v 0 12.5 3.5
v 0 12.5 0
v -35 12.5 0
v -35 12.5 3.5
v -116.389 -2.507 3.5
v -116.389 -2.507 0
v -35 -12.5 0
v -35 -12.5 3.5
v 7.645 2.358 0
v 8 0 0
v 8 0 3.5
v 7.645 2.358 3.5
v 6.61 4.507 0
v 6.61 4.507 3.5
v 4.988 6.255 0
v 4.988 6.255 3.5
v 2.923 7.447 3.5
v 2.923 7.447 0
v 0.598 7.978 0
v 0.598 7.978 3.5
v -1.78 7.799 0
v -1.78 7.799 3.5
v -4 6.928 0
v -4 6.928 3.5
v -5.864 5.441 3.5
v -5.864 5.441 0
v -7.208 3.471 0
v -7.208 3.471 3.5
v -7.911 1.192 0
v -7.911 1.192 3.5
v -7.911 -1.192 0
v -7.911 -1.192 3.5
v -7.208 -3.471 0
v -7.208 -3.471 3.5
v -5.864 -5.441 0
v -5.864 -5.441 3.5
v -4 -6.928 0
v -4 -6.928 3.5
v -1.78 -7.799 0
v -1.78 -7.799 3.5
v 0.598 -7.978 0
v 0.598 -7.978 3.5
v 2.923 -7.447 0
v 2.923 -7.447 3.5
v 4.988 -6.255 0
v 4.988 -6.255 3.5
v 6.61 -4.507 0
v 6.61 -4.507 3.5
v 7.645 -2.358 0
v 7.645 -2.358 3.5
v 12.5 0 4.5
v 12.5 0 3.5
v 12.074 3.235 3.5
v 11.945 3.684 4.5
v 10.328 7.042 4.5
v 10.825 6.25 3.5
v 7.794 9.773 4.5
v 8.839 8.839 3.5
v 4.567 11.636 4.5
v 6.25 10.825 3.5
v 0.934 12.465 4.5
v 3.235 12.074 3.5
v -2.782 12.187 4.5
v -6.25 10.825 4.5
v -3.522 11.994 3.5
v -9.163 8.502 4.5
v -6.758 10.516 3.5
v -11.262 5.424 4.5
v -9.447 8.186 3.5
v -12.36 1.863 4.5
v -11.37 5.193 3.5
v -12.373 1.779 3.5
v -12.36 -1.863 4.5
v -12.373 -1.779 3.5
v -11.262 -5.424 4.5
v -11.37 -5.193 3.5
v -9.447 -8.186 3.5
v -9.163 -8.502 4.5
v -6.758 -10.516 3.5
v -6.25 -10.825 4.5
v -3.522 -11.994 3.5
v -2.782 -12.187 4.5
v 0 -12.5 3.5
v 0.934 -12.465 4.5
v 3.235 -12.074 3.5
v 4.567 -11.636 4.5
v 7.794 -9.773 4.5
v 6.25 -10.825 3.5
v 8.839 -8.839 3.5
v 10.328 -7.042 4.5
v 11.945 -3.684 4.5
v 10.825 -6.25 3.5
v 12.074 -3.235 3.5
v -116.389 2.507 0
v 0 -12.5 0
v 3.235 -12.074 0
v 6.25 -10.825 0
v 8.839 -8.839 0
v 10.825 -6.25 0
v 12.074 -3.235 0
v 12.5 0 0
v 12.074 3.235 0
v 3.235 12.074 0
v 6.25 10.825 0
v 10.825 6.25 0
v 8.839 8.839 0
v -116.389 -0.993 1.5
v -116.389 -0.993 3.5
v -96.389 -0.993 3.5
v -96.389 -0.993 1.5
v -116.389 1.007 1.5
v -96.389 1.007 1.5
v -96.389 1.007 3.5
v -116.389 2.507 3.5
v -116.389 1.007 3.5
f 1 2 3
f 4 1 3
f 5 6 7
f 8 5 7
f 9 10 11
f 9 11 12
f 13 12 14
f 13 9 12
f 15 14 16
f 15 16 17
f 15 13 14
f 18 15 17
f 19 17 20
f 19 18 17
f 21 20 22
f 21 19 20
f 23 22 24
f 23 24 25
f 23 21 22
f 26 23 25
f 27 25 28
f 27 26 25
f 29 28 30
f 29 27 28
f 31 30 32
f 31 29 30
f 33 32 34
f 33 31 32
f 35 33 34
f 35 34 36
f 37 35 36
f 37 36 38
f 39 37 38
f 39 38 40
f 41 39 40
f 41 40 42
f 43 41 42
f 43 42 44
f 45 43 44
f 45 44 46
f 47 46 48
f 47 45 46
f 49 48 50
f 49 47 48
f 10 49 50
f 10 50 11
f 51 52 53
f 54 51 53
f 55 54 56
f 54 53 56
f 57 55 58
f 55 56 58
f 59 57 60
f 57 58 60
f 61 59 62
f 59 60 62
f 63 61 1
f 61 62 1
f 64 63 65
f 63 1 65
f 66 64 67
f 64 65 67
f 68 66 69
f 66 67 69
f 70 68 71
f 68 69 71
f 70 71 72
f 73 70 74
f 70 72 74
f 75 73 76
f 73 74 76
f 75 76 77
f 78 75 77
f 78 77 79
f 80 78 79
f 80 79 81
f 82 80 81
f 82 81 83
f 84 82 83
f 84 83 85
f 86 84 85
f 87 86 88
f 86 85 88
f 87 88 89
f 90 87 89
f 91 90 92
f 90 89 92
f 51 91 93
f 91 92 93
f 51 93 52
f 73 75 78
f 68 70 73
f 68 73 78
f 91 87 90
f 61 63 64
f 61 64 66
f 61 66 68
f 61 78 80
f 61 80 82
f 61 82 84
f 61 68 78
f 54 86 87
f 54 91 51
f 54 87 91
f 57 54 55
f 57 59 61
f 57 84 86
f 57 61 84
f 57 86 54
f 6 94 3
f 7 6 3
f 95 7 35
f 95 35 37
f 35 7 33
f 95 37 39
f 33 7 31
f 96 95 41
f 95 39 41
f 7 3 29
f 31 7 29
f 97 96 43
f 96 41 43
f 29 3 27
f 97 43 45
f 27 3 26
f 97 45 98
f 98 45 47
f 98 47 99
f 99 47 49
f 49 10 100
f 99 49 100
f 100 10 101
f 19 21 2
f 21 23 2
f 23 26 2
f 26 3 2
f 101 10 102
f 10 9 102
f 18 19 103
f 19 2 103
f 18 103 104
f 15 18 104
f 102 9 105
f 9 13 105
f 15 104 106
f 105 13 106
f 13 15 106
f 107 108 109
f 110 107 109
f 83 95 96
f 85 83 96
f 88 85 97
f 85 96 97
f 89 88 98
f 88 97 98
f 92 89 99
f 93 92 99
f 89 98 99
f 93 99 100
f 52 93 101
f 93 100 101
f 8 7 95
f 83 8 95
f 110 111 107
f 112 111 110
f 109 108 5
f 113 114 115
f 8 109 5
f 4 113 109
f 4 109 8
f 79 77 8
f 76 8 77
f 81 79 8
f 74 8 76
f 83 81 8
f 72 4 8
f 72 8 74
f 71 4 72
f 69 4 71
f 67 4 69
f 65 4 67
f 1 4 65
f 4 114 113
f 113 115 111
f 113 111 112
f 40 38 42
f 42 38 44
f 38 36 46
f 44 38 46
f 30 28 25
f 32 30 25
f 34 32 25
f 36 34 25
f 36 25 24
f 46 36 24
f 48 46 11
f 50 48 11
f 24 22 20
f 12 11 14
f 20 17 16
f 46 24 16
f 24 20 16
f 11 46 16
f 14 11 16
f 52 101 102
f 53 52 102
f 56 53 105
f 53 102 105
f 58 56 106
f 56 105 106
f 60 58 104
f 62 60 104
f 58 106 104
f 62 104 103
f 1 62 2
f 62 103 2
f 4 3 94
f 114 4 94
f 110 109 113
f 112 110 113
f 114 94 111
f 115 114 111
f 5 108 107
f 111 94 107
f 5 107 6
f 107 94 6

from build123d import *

# Parameters (mm, degrees)
F0_R     = 8
F1_DEPTH = 3.5
F2_R     = 12.5
F3_DEPTH = 1
F4_W     = 20
F4_H     = 2
F5_DEPTH = 2


with BuildPart() as f1:
    # F0 (on Top) → F1 (new body)
    with BuildSketch(Plane.XY):
        with BuildLine():
            ThreePointArc((0, -12.5), (-12.5, 0), (0, 12.5))
            Line((0, 12.5), (-35, 12.5))
            Line((-35, 12.5), (-116.388784, 2.506714))
            Line((-116.388784, 2.506714), (-116.388784, -2.506714))
            Line((-116.388784, -2.506714), (-35, -12.5))
            Line((-35, -12.5), (0, -12.5))
        make_face()
        with BuildLine():
            ThreePointArc((0, -12.5), (8.838835, -8.838835), (12.5, 0))
            ThreePointArc((12.5, 0), (8.838835, 8.838835), (0, 12.5))
            ThreePointArc((0, 12.5), (-12.5, 0), (0, -12.5))
        make_face()
        Circle(F0_R, mode=Mode.SUBTRACT)
    extrude(amount=F1_DEPTH)

    # F2 (on face) → F3 (join)
    with BuildSketch(Plane.XY.offset(3.5)):
        Circle(F2_R)
    extrude(amount=F3_DEPTH)

    # F4 (on face) → F5 (cut)
    with BuildSketch(Plane.XY.offset(3.5)):
        with Locations((-106.388784, 0.006714)):
            Rectangle(F4_W, F4_H)
    extrude(amount=-F5_DEPTH, mode=Mode.SUBTRACT)


solid = f1.part
